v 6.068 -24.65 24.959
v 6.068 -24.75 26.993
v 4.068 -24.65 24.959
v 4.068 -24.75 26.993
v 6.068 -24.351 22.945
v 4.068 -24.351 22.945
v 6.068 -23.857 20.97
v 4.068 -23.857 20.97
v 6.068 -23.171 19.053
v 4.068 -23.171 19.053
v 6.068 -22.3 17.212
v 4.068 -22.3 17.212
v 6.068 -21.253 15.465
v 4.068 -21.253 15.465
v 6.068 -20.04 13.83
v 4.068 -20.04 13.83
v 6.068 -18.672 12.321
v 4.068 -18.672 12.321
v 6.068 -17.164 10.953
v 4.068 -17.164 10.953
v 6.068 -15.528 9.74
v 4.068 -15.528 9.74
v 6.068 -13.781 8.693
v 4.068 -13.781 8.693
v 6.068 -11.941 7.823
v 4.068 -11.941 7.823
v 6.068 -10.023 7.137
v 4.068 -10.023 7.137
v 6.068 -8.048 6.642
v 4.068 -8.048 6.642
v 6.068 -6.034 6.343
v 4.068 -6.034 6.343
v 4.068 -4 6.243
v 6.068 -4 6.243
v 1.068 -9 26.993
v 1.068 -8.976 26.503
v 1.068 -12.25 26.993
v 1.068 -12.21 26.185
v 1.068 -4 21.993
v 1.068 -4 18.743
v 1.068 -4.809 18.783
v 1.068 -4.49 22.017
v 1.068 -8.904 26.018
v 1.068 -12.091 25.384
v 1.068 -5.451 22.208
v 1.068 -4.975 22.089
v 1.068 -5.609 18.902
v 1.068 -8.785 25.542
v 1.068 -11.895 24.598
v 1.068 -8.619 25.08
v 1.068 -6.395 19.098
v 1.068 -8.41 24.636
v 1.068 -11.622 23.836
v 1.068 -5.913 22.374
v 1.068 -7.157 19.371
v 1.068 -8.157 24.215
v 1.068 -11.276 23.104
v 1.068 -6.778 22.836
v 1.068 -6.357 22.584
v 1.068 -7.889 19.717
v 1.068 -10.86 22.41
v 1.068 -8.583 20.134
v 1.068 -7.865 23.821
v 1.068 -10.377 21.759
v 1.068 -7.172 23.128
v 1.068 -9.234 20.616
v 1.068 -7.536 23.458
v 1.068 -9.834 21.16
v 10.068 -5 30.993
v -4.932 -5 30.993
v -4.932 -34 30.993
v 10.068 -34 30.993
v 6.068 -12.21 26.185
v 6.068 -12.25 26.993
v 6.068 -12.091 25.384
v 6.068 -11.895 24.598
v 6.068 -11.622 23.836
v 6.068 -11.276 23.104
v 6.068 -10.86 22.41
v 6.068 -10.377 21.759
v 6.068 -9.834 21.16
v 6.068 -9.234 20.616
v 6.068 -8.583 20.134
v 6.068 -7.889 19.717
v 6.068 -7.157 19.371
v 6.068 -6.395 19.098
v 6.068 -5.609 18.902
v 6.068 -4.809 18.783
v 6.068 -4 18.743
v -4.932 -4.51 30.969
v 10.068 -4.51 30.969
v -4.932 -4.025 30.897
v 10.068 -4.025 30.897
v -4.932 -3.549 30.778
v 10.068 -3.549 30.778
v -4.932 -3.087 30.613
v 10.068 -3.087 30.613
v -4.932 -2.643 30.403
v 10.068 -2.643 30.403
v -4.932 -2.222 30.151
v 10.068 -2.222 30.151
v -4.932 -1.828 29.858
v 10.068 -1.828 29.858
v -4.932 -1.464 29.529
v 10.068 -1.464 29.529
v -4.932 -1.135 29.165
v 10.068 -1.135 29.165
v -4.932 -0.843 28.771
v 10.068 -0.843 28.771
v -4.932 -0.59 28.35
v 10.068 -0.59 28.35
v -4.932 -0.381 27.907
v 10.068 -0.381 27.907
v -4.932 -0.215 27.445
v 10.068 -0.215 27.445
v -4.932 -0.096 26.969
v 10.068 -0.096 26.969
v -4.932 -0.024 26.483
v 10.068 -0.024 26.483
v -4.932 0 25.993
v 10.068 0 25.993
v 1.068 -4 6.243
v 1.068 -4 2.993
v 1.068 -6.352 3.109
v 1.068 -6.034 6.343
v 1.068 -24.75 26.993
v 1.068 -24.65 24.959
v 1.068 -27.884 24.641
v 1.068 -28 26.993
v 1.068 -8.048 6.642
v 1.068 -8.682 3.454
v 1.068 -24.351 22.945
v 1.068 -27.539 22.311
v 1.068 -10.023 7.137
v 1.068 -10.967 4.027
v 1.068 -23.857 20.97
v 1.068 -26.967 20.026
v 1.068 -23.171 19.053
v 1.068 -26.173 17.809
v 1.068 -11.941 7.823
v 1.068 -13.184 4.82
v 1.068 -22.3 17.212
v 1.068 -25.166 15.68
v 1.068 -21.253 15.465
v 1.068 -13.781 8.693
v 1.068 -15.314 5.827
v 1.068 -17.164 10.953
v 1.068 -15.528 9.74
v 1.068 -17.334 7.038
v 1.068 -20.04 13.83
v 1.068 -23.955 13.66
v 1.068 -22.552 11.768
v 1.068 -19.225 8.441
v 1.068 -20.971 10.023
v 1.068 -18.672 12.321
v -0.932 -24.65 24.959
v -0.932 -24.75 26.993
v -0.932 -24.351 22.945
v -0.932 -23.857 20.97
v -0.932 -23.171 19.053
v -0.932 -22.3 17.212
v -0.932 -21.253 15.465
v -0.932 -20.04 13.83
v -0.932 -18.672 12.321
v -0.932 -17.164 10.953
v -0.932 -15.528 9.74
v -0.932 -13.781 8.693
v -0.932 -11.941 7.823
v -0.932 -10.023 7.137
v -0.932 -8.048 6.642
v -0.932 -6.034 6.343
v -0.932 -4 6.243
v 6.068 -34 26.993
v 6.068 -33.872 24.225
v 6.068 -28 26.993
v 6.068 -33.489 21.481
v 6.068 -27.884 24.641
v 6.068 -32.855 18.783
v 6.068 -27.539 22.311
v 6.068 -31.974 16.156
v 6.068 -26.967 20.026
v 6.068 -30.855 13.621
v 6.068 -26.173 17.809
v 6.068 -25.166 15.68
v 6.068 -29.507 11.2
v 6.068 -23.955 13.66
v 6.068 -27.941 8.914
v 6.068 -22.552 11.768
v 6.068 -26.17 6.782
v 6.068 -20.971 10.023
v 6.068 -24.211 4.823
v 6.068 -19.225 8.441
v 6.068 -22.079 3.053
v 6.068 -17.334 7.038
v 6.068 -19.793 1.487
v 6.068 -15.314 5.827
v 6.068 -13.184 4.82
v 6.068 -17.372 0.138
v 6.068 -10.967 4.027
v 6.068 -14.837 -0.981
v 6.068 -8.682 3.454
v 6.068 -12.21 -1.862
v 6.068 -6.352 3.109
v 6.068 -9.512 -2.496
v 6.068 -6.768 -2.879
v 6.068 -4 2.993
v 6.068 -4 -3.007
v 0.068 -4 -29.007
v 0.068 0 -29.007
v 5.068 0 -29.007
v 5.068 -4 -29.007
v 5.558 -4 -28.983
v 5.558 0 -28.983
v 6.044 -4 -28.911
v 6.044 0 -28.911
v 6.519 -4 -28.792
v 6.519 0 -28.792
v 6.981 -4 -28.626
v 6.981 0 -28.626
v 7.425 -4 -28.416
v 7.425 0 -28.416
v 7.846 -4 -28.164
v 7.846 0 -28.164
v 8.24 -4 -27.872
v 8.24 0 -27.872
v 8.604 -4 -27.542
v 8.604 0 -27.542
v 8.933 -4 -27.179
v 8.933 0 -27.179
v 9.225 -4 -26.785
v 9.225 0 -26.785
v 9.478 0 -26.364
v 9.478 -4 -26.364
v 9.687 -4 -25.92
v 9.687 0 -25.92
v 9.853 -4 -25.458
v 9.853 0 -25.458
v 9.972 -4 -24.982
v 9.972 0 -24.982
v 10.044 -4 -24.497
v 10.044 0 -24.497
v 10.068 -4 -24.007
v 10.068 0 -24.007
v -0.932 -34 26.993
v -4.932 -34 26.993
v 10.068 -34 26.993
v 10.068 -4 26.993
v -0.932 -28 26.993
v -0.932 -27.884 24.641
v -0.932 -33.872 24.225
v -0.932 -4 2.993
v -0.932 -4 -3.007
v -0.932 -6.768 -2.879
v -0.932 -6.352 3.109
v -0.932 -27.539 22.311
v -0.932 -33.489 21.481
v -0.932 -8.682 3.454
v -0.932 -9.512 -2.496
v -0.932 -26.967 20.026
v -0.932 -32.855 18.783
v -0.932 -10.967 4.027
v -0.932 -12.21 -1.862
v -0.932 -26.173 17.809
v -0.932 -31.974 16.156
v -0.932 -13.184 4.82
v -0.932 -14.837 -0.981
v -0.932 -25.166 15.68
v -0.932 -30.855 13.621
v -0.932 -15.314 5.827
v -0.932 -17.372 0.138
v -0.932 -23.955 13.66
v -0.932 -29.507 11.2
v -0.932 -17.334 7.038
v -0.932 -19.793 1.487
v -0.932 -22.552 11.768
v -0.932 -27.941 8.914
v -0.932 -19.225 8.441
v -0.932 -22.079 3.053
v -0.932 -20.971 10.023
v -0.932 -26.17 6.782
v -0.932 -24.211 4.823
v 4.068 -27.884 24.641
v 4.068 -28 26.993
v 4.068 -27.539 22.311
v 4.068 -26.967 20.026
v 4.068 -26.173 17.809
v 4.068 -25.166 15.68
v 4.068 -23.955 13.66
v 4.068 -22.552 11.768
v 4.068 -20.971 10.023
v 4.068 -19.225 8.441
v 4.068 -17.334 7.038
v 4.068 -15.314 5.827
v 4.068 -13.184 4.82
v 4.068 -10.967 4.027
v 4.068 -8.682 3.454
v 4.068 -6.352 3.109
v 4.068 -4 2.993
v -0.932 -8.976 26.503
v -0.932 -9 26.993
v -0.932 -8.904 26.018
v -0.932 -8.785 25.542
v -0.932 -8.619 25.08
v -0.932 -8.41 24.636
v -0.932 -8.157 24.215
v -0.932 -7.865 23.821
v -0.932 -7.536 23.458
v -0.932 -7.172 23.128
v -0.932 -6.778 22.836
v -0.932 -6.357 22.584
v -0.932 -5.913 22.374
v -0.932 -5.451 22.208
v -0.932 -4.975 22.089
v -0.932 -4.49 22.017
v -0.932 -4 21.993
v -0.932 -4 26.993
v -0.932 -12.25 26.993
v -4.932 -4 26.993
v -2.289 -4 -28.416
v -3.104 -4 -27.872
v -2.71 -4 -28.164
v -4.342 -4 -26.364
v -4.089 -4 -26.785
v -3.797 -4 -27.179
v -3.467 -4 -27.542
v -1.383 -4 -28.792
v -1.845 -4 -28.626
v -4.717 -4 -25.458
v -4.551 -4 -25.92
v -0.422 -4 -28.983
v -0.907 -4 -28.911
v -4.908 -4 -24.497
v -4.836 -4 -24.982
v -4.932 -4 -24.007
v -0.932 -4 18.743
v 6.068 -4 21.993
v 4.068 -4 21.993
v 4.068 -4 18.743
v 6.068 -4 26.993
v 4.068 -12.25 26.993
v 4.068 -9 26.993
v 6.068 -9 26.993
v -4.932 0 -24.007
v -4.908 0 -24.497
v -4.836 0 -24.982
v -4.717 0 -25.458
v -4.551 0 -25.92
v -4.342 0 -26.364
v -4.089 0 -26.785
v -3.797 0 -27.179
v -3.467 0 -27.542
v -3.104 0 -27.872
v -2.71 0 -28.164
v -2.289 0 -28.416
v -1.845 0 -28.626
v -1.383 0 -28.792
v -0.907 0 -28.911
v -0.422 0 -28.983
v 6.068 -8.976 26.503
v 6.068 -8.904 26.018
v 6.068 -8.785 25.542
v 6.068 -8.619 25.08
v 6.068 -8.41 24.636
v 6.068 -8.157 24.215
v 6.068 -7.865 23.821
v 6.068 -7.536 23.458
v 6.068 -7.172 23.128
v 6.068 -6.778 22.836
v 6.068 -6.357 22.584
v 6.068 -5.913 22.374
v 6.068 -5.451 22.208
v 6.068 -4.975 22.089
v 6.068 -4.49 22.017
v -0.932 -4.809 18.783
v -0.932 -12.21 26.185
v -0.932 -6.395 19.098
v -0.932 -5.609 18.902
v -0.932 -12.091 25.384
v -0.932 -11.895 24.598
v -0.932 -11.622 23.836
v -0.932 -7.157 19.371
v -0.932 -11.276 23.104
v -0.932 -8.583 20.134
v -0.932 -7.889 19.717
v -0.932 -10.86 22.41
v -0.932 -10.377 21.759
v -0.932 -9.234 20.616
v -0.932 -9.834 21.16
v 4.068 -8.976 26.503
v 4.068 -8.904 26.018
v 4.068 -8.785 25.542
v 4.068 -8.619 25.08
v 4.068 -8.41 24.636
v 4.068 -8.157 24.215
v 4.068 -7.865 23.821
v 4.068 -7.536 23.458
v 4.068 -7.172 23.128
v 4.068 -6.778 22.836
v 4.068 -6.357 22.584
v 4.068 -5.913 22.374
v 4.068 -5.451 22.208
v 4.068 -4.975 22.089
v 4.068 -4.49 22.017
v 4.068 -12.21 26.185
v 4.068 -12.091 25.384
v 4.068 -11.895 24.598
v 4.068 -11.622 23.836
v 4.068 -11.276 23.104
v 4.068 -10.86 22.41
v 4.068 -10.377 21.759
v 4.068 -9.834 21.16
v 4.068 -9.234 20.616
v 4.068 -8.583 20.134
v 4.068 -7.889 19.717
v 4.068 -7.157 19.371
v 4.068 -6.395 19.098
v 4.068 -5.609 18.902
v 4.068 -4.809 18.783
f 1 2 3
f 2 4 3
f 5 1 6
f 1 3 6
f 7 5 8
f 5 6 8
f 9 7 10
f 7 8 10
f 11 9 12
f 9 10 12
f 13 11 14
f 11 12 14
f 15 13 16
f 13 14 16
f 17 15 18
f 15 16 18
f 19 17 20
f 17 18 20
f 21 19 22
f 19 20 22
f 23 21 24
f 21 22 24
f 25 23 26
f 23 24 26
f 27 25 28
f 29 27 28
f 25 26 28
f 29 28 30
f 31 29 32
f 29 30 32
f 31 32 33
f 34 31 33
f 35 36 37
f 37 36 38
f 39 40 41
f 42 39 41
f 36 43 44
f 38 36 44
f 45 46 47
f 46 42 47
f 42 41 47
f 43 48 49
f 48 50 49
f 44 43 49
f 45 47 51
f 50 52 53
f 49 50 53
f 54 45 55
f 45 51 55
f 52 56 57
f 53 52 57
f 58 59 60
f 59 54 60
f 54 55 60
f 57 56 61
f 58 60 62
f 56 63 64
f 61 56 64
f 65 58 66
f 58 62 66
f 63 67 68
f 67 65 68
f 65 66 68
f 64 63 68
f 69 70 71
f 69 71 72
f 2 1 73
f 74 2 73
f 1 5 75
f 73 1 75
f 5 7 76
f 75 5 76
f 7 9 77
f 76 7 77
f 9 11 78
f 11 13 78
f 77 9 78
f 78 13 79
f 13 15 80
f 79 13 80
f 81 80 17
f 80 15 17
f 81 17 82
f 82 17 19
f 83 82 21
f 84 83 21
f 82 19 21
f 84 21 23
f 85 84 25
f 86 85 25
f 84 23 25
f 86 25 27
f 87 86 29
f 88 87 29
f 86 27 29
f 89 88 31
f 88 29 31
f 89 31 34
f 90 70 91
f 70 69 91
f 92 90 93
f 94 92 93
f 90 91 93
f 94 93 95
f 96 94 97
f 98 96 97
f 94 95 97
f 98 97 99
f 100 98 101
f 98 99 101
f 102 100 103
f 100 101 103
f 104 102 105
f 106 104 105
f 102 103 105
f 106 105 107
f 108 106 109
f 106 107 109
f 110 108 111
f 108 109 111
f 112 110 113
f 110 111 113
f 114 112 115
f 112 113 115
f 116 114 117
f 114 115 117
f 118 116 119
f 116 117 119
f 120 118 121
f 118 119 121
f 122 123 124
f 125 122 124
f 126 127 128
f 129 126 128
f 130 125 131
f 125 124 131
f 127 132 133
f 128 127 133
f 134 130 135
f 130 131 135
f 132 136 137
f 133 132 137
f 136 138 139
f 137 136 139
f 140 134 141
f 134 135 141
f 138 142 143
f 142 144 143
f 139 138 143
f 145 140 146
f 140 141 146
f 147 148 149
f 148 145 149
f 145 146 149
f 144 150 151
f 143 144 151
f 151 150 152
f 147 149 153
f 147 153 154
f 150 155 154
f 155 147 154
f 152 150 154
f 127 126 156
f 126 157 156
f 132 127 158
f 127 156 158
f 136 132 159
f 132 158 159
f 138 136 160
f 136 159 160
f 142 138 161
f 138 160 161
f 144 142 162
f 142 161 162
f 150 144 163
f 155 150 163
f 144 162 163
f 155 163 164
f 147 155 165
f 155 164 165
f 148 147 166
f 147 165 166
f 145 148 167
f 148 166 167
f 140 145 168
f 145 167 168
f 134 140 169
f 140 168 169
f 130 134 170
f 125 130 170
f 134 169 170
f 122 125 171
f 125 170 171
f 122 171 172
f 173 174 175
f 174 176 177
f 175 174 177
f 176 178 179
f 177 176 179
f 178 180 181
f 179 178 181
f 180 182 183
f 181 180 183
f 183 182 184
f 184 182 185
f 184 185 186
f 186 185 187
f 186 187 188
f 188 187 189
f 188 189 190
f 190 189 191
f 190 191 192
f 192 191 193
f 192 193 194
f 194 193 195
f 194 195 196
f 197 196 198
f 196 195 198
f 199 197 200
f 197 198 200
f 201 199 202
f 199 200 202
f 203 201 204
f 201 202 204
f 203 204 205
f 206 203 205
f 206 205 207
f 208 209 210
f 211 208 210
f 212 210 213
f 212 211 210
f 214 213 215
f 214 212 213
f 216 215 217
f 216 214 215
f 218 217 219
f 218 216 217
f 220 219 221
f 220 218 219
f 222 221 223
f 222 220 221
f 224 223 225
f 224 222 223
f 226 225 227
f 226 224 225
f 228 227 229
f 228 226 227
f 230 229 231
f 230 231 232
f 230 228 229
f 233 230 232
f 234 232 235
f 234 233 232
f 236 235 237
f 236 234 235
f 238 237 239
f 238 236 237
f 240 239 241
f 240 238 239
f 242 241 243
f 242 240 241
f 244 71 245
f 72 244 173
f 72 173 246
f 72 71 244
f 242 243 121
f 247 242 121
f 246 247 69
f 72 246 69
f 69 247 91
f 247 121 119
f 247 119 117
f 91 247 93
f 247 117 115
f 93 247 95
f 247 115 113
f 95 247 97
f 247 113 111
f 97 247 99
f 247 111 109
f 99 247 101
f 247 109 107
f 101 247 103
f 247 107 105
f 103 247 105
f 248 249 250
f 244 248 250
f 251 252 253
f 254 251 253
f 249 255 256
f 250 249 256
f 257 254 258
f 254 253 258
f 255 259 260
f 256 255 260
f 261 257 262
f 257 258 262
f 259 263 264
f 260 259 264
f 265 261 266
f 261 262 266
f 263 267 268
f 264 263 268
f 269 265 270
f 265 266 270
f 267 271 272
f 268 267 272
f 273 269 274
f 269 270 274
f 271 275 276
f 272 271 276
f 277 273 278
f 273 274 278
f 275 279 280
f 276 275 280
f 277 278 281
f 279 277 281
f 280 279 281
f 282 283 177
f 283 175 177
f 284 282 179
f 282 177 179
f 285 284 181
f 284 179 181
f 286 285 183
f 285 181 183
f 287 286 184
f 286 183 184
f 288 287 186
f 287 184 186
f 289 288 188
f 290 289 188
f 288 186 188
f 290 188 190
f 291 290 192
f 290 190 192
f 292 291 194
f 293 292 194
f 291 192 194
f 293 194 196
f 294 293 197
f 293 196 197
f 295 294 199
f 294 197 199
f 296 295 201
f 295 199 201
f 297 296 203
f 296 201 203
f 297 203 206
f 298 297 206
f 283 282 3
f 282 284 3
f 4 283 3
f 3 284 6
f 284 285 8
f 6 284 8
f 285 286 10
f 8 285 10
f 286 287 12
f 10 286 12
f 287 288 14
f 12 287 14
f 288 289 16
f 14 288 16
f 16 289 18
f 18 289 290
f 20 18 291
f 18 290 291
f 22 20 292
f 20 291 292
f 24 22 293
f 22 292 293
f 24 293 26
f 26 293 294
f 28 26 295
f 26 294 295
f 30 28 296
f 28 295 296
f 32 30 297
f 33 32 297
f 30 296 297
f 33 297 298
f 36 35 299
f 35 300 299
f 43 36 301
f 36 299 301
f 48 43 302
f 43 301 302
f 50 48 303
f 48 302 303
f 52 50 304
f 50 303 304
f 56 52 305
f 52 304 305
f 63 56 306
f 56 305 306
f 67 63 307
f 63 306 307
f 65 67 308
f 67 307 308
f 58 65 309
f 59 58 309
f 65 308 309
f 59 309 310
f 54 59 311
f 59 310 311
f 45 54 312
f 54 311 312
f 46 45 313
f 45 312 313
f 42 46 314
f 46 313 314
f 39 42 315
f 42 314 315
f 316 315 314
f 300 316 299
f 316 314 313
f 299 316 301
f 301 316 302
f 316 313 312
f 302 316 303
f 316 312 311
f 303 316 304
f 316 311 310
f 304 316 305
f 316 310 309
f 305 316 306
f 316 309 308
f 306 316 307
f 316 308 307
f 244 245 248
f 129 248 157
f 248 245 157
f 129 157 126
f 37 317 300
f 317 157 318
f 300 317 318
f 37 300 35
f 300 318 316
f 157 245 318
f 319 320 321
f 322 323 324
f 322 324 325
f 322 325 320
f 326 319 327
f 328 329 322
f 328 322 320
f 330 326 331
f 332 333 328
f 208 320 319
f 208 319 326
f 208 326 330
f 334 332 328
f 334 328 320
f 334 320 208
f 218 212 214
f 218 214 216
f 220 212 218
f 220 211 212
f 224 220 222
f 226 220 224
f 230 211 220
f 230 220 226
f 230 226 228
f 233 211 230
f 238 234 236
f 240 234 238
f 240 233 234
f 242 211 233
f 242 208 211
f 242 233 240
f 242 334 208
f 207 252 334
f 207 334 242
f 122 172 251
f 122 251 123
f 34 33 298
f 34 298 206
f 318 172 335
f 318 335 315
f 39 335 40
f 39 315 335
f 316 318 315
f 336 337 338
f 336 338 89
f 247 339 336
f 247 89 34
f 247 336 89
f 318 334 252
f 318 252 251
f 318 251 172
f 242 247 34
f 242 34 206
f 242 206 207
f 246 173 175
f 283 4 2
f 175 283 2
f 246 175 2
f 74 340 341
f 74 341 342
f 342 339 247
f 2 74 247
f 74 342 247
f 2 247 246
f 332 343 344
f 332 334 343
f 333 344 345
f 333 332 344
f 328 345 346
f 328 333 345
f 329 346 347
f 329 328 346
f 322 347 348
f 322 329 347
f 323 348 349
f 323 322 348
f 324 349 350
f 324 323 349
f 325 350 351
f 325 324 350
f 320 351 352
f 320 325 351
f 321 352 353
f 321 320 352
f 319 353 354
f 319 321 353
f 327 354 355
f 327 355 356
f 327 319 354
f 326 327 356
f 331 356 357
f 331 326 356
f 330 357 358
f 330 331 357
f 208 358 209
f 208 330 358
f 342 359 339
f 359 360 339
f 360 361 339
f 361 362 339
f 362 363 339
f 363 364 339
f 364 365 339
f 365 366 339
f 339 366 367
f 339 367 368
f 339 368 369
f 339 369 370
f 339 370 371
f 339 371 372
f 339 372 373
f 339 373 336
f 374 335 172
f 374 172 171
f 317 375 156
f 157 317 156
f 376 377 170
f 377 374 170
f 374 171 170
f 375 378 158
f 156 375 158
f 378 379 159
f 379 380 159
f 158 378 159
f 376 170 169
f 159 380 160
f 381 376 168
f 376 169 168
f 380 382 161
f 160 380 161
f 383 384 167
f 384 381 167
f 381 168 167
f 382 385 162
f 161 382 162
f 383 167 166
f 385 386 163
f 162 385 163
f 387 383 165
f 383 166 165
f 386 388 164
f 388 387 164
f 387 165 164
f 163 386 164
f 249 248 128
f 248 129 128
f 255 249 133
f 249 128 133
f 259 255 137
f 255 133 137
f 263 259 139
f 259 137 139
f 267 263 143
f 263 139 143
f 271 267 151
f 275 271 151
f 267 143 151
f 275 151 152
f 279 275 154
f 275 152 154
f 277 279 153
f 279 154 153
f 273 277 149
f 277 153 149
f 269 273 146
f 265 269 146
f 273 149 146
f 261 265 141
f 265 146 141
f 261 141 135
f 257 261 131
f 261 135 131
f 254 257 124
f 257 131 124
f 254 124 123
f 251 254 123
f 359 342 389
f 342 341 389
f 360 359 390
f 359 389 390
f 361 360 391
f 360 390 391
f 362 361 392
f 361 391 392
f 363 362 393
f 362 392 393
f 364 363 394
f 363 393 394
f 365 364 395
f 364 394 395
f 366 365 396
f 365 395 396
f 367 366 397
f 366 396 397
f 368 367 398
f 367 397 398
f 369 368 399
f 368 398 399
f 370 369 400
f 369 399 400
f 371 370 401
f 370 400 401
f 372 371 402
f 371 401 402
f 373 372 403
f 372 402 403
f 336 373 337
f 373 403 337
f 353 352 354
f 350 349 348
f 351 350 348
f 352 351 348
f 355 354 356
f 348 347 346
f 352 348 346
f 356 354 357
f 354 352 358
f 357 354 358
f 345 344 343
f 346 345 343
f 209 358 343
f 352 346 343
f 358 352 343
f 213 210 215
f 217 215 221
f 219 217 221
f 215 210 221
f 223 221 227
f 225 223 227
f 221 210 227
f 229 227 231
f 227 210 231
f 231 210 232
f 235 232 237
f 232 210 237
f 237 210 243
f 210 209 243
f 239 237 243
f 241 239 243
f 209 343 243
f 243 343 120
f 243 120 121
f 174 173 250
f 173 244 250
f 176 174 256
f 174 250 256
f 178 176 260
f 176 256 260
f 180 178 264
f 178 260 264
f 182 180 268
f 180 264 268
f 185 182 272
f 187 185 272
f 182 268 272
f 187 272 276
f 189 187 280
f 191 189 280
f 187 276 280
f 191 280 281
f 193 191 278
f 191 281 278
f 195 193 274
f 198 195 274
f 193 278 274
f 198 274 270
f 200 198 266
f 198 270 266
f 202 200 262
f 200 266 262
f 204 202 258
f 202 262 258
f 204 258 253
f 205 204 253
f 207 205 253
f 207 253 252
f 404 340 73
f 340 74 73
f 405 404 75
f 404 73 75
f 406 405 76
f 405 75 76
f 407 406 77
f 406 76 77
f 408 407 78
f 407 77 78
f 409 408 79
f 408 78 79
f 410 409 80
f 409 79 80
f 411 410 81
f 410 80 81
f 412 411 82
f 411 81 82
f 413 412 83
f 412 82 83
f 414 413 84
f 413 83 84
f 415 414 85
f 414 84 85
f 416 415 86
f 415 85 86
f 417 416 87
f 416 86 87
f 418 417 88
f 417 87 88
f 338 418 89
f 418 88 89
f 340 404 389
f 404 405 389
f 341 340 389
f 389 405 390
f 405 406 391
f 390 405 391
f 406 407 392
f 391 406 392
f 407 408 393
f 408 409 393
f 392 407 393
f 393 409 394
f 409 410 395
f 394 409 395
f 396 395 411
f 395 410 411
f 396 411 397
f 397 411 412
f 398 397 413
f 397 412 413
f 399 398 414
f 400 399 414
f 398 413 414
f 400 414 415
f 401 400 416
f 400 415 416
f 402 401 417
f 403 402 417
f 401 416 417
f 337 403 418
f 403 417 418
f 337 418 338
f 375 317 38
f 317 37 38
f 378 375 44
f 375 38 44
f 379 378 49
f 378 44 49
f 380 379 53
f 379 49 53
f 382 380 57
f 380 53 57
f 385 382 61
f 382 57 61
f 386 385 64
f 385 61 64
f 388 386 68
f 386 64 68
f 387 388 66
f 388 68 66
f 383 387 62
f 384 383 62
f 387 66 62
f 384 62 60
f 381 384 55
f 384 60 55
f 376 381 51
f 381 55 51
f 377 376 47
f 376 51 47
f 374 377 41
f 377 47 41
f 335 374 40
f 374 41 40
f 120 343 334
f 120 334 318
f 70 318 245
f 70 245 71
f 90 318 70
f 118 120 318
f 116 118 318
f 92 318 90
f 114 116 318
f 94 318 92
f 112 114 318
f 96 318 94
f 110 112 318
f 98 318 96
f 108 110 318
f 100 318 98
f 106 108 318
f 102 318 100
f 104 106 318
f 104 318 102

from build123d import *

# Parameters (mm, degrees)
F0_W     = 15
F0_H     = 60
F1_DEPTH = 4
F2_W     = 15
F2_H     = 4
F3_DEPTH = 30
F5_ANGLE = -90
F8_R     = 5
F9_R     = 5


with BuildPart() as f1:
    # F0 (on Front) → F1 (new body)
    with BuildSketch(Plane.XZ):
        with Locations((2.568068, 0.993193)):
            Rectangle(F0_W, F0_H)
    extrude(amount=F1_DEPTH)

    # F2 (on face) → F3 (join)
    with BuildSketch(Plane.XZ.offset(4)):
        with Locations((2.568068, 28.993193)):
            Rectangle(F2_W, F2_H)
    extrude(amount=F3_DEPTH)

    # F4 (on face) → F5 (revolve)
    with BuildSketch(Plane(origin=(0, 0, 26.993193), x_dir=(1, 0, 0), z_dir=(0, 0, -1))):
        Polygon((6.068068, 28), (6.068068, 34), (-0.931932, 34), (-0.931932, 28), (1.068068, 28), (1.068068, 24.75), (-0.931932, 24.75), (-0.931932, 12.25), (1.068068, 12.25), (1.068068, 9), (-0.931932, 9), (-0.931932, 4), (6.068068, 4), (6.068068, 9), (4.068068, 9), (4.068068, 12.25), (6.068068, 12.25), (6.068068, 24.75), (4.068068, 24.75), (4.068068, 28), align=None)
    revolve(axis=Axis((2.568068, -4, 26.993193), (-1, 0, 0)), revolution_arc=F5_ANGLE)

    # F8
    f8_edges = [f1.edges().sort_by_distance(p)[0] for p in [
        (2.568068, 0, 30.993193),
    ]]
    fillet(f8_edges, radius=F8_R)

    # F9
    f9_edges = [f1.edges().sort_by_distance(p)[0] for p in [
        (10.068068, -2, -29.006807),
        (-4.931932, -2, -29.006807),
    ]]
    fillet(f9_edges, radius=F9_R)


solid = f1.part
